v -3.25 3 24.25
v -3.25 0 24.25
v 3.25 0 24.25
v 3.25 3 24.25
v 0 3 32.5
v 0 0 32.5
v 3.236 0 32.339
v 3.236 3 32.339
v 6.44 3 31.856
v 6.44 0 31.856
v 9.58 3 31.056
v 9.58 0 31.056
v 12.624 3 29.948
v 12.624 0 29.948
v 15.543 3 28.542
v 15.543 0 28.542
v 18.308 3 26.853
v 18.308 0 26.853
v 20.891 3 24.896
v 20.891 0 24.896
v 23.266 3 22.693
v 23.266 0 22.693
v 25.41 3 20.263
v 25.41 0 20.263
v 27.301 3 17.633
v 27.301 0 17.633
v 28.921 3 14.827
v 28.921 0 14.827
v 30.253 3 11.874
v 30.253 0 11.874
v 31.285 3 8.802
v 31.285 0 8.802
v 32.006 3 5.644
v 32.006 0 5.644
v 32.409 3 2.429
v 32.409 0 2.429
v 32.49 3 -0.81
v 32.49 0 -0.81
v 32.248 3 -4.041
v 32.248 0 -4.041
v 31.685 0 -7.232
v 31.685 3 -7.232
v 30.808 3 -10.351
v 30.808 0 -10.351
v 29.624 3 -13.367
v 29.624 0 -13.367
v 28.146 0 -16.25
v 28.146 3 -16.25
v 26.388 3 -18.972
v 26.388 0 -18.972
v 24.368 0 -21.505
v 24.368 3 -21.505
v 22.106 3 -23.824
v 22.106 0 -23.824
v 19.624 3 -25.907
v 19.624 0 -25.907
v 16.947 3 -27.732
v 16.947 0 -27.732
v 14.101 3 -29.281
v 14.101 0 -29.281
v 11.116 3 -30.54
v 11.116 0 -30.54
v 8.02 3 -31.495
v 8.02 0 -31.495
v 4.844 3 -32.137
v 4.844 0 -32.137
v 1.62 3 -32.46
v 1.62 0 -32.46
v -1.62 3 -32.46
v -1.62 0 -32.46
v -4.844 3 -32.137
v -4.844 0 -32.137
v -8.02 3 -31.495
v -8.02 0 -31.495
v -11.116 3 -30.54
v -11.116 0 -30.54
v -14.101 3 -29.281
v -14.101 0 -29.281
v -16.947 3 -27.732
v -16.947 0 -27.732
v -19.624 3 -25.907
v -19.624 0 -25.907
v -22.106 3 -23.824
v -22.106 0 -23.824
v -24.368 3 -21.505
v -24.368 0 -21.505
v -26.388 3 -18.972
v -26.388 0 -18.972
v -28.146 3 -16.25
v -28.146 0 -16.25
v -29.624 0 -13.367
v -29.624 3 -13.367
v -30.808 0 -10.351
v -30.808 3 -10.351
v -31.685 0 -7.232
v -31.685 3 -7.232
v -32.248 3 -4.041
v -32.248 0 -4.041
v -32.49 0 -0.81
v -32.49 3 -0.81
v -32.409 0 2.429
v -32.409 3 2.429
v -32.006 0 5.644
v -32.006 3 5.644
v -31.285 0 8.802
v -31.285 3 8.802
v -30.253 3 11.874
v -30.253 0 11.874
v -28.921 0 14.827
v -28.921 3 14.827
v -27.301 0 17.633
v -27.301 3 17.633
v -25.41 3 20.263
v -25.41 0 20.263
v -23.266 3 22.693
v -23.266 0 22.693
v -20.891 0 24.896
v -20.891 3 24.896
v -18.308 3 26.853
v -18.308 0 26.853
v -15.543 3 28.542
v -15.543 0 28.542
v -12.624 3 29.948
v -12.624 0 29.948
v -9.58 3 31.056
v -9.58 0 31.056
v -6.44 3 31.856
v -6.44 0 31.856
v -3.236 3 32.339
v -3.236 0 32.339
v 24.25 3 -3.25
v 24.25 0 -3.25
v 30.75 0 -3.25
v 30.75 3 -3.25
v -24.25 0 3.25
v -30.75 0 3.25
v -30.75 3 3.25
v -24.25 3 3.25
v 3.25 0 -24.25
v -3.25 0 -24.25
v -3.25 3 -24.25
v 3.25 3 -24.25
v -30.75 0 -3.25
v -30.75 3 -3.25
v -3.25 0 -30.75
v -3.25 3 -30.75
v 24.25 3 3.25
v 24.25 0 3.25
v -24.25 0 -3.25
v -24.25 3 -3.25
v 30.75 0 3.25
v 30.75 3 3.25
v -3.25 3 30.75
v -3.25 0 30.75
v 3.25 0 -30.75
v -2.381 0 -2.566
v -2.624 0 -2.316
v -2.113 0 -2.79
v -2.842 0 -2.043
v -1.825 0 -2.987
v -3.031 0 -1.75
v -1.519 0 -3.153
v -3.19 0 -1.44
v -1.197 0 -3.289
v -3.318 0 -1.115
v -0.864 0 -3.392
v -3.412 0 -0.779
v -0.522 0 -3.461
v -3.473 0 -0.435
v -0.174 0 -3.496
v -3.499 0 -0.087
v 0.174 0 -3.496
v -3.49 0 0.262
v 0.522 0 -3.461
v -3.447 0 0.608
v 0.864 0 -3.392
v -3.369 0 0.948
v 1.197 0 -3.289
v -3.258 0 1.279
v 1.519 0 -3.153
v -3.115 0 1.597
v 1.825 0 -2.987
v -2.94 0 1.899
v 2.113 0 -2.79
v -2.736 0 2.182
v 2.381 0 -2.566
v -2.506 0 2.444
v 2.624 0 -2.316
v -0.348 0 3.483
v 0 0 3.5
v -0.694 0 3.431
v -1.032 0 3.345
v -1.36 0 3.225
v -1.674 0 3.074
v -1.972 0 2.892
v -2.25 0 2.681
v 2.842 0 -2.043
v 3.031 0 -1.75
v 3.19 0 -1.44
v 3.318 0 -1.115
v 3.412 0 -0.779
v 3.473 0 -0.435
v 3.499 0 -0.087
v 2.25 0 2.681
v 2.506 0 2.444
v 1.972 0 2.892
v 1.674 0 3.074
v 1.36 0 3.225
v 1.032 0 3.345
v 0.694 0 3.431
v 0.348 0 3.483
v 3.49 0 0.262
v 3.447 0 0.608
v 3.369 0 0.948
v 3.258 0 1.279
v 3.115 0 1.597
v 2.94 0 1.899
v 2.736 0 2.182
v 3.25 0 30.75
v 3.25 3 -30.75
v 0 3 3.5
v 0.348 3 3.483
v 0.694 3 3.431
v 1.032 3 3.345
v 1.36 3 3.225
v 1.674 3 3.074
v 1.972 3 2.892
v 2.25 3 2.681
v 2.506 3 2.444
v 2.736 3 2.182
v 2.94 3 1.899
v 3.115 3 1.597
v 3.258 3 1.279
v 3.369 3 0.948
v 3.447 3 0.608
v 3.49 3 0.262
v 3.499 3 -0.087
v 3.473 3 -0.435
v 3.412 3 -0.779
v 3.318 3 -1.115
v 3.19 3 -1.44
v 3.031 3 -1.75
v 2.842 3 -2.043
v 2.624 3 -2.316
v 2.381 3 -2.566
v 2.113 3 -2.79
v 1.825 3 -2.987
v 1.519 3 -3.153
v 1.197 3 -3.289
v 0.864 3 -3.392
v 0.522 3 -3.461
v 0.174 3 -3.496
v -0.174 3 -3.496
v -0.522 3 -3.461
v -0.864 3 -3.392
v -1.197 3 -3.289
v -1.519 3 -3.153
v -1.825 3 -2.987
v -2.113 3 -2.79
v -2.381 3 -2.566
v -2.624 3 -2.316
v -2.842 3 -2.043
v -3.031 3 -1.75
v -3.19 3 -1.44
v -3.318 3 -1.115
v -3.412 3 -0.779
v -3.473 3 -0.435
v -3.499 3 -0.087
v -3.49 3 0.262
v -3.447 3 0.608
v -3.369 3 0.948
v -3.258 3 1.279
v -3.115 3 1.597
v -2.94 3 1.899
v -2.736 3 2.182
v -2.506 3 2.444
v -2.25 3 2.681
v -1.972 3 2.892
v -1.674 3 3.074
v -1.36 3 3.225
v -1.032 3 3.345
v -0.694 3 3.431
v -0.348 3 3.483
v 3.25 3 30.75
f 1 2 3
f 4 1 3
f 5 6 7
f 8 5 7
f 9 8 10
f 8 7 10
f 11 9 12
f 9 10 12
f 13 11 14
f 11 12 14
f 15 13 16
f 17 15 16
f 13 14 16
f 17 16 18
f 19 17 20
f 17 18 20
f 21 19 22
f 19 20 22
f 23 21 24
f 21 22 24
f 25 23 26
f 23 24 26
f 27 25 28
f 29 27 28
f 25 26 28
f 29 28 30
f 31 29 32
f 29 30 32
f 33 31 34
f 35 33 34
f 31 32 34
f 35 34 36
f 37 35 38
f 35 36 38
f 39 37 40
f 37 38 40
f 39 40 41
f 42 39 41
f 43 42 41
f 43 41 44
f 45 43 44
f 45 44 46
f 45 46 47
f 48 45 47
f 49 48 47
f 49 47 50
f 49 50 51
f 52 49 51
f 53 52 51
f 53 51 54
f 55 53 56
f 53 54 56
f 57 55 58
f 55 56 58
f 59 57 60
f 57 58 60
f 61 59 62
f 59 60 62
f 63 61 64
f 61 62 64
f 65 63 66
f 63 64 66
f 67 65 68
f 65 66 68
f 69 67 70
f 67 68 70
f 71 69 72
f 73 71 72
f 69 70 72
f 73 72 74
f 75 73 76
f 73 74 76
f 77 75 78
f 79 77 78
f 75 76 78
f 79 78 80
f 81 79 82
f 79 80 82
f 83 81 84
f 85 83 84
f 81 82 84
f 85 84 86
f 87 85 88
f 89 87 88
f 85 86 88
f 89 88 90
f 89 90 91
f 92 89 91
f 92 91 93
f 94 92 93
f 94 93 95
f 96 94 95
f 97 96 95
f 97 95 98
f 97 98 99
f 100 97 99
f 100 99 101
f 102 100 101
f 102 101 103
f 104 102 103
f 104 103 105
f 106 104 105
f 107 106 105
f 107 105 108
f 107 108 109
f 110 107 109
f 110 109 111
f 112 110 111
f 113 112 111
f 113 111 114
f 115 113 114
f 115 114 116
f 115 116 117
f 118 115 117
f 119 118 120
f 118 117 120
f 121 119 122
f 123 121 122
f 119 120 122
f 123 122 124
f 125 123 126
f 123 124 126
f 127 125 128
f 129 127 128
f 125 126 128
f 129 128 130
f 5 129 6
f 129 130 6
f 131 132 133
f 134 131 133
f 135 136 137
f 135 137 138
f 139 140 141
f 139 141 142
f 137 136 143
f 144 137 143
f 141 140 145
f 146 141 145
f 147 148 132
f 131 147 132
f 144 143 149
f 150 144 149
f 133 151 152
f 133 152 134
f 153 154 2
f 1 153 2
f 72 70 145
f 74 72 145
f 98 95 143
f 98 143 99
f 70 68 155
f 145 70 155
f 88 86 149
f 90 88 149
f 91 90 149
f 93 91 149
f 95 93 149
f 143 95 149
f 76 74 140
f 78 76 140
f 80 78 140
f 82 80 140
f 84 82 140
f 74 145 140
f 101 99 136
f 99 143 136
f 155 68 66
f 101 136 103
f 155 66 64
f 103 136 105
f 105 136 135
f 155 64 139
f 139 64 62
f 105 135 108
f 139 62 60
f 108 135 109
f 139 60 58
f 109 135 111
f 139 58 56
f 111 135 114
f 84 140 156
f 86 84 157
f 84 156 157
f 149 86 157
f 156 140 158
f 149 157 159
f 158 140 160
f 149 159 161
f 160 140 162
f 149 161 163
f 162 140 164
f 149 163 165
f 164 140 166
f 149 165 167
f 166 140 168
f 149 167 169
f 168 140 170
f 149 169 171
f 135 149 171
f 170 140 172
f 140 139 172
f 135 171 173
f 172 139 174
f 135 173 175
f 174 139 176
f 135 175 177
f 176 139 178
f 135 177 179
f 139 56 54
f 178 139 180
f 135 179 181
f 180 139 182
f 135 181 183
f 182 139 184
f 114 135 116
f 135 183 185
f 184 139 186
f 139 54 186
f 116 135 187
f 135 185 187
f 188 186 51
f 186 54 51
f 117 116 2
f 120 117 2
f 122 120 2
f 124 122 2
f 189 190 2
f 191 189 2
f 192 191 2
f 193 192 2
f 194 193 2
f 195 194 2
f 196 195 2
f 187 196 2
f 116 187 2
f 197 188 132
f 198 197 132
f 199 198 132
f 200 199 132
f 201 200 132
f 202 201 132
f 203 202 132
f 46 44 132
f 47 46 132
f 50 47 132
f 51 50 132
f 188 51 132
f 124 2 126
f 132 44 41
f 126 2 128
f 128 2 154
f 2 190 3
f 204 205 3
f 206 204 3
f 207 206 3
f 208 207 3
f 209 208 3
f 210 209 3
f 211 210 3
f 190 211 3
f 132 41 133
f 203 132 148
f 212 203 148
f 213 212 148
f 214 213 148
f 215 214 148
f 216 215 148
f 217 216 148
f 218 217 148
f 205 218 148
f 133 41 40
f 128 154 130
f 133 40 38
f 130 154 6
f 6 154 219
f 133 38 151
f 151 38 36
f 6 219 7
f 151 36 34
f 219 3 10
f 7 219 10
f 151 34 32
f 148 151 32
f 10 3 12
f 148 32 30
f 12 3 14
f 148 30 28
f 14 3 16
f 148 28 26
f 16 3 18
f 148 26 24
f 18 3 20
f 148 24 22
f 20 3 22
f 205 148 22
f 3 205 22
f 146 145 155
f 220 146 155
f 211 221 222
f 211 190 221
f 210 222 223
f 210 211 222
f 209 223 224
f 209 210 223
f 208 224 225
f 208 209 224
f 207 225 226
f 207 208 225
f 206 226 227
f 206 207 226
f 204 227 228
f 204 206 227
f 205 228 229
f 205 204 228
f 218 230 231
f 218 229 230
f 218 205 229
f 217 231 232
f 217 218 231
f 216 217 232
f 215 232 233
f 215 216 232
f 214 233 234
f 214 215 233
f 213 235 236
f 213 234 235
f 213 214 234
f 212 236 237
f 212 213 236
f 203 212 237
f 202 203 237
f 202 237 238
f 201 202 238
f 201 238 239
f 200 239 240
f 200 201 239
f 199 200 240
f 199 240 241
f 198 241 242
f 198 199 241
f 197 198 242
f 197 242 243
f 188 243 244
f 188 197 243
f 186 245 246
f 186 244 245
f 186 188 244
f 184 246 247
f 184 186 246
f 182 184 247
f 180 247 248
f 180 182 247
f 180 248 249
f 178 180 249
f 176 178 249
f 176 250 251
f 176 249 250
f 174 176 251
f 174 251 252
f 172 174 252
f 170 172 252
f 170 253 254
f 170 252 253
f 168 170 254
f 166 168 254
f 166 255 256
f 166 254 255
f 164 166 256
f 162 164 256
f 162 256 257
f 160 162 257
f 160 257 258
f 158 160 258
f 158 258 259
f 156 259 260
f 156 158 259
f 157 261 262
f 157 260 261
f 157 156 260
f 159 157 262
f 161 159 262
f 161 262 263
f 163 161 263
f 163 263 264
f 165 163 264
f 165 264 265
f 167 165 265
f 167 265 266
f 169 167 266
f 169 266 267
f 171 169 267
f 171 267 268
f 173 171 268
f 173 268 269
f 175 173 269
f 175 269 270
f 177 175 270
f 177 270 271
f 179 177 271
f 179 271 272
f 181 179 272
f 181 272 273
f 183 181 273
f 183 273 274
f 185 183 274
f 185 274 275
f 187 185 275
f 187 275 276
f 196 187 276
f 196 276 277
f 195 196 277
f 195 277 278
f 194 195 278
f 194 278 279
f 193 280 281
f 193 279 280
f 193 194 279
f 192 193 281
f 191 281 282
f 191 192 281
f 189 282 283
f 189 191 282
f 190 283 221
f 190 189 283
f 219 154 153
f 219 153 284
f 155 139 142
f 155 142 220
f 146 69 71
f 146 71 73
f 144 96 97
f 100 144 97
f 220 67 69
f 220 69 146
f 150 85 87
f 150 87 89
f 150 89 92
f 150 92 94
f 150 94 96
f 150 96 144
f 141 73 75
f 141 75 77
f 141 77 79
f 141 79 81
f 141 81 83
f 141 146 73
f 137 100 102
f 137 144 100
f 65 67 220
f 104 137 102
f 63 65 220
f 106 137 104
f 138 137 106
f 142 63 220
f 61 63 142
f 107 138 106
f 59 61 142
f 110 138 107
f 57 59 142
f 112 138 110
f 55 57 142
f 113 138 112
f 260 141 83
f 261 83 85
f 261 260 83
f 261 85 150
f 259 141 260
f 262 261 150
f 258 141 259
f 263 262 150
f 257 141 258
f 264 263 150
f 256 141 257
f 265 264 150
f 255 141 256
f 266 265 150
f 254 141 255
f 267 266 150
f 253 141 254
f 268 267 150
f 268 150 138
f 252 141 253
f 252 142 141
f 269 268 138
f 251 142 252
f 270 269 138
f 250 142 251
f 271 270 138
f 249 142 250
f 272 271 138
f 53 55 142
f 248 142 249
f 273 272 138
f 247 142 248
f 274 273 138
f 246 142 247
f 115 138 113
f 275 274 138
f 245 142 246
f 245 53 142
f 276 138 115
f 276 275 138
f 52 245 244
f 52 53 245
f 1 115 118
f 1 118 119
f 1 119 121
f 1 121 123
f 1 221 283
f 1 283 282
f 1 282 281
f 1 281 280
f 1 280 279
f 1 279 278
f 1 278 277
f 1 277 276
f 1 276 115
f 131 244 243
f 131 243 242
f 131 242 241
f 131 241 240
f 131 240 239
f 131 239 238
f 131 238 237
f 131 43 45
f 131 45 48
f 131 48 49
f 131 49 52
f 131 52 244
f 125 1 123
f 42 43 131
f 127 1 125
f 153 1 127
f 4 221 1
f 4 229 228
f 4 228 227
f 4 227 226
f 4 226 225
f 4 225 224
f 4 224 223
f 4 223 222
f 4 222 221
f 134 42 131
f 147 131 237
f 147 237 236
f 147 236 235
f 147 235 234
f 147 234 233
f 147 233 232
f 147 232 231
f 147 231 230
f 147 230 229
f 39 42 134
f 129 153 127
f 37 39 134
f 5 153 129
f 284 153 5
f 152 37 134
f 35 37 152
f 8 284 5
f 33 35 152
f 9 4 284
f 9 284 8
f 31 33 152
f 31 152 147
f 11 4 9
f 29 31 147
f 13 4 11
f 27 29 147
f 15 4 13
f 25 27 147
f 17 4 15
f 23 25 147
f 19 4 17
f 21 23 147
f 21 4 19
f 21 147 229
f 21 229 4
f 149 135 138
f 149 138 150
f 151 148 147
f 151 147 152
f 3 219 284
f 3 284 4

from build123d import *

# Parameters (mm, degrees)
SKETCH1_R               = 32.5
BOSS_EXTRUDE1_DEPTH     = 3
CUT_EXTRUDE1_DEPTH      = 10
CUT_EXTRUDE1_DEPTH_BACK = 47.059743812
SKETCH2_R               = 3.5
SKETCH2_W               = 6.5
SKETCH2_H               = 6.5


with BuildPart() as part:
    # Sketch1 → Boss-Extrude1 (new body)
    with BuildSketch(Plane(origin=(0, 0, 0), x_dir=(1, 0, 0), z_dir=(0, 1, 0))):
        with Locations(Location((0, 0, 0), (0, 0, 270))):
            Circle(SKETCH1_R)
    extrude(amount=BOSS_EXTRUDE1_DEPTH)

    # Sketch2 → Cut-Extrude1 (cut, two sides: drawn at the far end of the back side and taken through both)
    with BuildSketch(Plane(origin=(0, 0, 0), x_dir=(1, 0, 0), z_dir=(0, 1, 0)).offset(-CUT_EXTRUDE1_DEPTH_BACK)):
        with Locations(Location((0, 0, 0), (0, 0, 270))):
            Circle(SKETCH2_R)
        with Locations((0, -27.5)):
            Rectangle(SKETCH2_W, SKETCH2_H)
        with Locations((27.5, 0)):
            Rectangle(SKETCH2_W, SKETCH2_H)
        with Locations((-27.5, 0)):
            Rectangle(SKETCH2_W, SKETCH2_H)
        with Locations((0, 27.5)):
            Rectangle(SKETCH2_W, SKETCH2_H)
    extrude(amount=CUT_EXTRUDE1_DEPTH + CUT_EXTRUDE1_DEPTH_BACK, mode=Mode.SUBTRACT)


solid = part.part
